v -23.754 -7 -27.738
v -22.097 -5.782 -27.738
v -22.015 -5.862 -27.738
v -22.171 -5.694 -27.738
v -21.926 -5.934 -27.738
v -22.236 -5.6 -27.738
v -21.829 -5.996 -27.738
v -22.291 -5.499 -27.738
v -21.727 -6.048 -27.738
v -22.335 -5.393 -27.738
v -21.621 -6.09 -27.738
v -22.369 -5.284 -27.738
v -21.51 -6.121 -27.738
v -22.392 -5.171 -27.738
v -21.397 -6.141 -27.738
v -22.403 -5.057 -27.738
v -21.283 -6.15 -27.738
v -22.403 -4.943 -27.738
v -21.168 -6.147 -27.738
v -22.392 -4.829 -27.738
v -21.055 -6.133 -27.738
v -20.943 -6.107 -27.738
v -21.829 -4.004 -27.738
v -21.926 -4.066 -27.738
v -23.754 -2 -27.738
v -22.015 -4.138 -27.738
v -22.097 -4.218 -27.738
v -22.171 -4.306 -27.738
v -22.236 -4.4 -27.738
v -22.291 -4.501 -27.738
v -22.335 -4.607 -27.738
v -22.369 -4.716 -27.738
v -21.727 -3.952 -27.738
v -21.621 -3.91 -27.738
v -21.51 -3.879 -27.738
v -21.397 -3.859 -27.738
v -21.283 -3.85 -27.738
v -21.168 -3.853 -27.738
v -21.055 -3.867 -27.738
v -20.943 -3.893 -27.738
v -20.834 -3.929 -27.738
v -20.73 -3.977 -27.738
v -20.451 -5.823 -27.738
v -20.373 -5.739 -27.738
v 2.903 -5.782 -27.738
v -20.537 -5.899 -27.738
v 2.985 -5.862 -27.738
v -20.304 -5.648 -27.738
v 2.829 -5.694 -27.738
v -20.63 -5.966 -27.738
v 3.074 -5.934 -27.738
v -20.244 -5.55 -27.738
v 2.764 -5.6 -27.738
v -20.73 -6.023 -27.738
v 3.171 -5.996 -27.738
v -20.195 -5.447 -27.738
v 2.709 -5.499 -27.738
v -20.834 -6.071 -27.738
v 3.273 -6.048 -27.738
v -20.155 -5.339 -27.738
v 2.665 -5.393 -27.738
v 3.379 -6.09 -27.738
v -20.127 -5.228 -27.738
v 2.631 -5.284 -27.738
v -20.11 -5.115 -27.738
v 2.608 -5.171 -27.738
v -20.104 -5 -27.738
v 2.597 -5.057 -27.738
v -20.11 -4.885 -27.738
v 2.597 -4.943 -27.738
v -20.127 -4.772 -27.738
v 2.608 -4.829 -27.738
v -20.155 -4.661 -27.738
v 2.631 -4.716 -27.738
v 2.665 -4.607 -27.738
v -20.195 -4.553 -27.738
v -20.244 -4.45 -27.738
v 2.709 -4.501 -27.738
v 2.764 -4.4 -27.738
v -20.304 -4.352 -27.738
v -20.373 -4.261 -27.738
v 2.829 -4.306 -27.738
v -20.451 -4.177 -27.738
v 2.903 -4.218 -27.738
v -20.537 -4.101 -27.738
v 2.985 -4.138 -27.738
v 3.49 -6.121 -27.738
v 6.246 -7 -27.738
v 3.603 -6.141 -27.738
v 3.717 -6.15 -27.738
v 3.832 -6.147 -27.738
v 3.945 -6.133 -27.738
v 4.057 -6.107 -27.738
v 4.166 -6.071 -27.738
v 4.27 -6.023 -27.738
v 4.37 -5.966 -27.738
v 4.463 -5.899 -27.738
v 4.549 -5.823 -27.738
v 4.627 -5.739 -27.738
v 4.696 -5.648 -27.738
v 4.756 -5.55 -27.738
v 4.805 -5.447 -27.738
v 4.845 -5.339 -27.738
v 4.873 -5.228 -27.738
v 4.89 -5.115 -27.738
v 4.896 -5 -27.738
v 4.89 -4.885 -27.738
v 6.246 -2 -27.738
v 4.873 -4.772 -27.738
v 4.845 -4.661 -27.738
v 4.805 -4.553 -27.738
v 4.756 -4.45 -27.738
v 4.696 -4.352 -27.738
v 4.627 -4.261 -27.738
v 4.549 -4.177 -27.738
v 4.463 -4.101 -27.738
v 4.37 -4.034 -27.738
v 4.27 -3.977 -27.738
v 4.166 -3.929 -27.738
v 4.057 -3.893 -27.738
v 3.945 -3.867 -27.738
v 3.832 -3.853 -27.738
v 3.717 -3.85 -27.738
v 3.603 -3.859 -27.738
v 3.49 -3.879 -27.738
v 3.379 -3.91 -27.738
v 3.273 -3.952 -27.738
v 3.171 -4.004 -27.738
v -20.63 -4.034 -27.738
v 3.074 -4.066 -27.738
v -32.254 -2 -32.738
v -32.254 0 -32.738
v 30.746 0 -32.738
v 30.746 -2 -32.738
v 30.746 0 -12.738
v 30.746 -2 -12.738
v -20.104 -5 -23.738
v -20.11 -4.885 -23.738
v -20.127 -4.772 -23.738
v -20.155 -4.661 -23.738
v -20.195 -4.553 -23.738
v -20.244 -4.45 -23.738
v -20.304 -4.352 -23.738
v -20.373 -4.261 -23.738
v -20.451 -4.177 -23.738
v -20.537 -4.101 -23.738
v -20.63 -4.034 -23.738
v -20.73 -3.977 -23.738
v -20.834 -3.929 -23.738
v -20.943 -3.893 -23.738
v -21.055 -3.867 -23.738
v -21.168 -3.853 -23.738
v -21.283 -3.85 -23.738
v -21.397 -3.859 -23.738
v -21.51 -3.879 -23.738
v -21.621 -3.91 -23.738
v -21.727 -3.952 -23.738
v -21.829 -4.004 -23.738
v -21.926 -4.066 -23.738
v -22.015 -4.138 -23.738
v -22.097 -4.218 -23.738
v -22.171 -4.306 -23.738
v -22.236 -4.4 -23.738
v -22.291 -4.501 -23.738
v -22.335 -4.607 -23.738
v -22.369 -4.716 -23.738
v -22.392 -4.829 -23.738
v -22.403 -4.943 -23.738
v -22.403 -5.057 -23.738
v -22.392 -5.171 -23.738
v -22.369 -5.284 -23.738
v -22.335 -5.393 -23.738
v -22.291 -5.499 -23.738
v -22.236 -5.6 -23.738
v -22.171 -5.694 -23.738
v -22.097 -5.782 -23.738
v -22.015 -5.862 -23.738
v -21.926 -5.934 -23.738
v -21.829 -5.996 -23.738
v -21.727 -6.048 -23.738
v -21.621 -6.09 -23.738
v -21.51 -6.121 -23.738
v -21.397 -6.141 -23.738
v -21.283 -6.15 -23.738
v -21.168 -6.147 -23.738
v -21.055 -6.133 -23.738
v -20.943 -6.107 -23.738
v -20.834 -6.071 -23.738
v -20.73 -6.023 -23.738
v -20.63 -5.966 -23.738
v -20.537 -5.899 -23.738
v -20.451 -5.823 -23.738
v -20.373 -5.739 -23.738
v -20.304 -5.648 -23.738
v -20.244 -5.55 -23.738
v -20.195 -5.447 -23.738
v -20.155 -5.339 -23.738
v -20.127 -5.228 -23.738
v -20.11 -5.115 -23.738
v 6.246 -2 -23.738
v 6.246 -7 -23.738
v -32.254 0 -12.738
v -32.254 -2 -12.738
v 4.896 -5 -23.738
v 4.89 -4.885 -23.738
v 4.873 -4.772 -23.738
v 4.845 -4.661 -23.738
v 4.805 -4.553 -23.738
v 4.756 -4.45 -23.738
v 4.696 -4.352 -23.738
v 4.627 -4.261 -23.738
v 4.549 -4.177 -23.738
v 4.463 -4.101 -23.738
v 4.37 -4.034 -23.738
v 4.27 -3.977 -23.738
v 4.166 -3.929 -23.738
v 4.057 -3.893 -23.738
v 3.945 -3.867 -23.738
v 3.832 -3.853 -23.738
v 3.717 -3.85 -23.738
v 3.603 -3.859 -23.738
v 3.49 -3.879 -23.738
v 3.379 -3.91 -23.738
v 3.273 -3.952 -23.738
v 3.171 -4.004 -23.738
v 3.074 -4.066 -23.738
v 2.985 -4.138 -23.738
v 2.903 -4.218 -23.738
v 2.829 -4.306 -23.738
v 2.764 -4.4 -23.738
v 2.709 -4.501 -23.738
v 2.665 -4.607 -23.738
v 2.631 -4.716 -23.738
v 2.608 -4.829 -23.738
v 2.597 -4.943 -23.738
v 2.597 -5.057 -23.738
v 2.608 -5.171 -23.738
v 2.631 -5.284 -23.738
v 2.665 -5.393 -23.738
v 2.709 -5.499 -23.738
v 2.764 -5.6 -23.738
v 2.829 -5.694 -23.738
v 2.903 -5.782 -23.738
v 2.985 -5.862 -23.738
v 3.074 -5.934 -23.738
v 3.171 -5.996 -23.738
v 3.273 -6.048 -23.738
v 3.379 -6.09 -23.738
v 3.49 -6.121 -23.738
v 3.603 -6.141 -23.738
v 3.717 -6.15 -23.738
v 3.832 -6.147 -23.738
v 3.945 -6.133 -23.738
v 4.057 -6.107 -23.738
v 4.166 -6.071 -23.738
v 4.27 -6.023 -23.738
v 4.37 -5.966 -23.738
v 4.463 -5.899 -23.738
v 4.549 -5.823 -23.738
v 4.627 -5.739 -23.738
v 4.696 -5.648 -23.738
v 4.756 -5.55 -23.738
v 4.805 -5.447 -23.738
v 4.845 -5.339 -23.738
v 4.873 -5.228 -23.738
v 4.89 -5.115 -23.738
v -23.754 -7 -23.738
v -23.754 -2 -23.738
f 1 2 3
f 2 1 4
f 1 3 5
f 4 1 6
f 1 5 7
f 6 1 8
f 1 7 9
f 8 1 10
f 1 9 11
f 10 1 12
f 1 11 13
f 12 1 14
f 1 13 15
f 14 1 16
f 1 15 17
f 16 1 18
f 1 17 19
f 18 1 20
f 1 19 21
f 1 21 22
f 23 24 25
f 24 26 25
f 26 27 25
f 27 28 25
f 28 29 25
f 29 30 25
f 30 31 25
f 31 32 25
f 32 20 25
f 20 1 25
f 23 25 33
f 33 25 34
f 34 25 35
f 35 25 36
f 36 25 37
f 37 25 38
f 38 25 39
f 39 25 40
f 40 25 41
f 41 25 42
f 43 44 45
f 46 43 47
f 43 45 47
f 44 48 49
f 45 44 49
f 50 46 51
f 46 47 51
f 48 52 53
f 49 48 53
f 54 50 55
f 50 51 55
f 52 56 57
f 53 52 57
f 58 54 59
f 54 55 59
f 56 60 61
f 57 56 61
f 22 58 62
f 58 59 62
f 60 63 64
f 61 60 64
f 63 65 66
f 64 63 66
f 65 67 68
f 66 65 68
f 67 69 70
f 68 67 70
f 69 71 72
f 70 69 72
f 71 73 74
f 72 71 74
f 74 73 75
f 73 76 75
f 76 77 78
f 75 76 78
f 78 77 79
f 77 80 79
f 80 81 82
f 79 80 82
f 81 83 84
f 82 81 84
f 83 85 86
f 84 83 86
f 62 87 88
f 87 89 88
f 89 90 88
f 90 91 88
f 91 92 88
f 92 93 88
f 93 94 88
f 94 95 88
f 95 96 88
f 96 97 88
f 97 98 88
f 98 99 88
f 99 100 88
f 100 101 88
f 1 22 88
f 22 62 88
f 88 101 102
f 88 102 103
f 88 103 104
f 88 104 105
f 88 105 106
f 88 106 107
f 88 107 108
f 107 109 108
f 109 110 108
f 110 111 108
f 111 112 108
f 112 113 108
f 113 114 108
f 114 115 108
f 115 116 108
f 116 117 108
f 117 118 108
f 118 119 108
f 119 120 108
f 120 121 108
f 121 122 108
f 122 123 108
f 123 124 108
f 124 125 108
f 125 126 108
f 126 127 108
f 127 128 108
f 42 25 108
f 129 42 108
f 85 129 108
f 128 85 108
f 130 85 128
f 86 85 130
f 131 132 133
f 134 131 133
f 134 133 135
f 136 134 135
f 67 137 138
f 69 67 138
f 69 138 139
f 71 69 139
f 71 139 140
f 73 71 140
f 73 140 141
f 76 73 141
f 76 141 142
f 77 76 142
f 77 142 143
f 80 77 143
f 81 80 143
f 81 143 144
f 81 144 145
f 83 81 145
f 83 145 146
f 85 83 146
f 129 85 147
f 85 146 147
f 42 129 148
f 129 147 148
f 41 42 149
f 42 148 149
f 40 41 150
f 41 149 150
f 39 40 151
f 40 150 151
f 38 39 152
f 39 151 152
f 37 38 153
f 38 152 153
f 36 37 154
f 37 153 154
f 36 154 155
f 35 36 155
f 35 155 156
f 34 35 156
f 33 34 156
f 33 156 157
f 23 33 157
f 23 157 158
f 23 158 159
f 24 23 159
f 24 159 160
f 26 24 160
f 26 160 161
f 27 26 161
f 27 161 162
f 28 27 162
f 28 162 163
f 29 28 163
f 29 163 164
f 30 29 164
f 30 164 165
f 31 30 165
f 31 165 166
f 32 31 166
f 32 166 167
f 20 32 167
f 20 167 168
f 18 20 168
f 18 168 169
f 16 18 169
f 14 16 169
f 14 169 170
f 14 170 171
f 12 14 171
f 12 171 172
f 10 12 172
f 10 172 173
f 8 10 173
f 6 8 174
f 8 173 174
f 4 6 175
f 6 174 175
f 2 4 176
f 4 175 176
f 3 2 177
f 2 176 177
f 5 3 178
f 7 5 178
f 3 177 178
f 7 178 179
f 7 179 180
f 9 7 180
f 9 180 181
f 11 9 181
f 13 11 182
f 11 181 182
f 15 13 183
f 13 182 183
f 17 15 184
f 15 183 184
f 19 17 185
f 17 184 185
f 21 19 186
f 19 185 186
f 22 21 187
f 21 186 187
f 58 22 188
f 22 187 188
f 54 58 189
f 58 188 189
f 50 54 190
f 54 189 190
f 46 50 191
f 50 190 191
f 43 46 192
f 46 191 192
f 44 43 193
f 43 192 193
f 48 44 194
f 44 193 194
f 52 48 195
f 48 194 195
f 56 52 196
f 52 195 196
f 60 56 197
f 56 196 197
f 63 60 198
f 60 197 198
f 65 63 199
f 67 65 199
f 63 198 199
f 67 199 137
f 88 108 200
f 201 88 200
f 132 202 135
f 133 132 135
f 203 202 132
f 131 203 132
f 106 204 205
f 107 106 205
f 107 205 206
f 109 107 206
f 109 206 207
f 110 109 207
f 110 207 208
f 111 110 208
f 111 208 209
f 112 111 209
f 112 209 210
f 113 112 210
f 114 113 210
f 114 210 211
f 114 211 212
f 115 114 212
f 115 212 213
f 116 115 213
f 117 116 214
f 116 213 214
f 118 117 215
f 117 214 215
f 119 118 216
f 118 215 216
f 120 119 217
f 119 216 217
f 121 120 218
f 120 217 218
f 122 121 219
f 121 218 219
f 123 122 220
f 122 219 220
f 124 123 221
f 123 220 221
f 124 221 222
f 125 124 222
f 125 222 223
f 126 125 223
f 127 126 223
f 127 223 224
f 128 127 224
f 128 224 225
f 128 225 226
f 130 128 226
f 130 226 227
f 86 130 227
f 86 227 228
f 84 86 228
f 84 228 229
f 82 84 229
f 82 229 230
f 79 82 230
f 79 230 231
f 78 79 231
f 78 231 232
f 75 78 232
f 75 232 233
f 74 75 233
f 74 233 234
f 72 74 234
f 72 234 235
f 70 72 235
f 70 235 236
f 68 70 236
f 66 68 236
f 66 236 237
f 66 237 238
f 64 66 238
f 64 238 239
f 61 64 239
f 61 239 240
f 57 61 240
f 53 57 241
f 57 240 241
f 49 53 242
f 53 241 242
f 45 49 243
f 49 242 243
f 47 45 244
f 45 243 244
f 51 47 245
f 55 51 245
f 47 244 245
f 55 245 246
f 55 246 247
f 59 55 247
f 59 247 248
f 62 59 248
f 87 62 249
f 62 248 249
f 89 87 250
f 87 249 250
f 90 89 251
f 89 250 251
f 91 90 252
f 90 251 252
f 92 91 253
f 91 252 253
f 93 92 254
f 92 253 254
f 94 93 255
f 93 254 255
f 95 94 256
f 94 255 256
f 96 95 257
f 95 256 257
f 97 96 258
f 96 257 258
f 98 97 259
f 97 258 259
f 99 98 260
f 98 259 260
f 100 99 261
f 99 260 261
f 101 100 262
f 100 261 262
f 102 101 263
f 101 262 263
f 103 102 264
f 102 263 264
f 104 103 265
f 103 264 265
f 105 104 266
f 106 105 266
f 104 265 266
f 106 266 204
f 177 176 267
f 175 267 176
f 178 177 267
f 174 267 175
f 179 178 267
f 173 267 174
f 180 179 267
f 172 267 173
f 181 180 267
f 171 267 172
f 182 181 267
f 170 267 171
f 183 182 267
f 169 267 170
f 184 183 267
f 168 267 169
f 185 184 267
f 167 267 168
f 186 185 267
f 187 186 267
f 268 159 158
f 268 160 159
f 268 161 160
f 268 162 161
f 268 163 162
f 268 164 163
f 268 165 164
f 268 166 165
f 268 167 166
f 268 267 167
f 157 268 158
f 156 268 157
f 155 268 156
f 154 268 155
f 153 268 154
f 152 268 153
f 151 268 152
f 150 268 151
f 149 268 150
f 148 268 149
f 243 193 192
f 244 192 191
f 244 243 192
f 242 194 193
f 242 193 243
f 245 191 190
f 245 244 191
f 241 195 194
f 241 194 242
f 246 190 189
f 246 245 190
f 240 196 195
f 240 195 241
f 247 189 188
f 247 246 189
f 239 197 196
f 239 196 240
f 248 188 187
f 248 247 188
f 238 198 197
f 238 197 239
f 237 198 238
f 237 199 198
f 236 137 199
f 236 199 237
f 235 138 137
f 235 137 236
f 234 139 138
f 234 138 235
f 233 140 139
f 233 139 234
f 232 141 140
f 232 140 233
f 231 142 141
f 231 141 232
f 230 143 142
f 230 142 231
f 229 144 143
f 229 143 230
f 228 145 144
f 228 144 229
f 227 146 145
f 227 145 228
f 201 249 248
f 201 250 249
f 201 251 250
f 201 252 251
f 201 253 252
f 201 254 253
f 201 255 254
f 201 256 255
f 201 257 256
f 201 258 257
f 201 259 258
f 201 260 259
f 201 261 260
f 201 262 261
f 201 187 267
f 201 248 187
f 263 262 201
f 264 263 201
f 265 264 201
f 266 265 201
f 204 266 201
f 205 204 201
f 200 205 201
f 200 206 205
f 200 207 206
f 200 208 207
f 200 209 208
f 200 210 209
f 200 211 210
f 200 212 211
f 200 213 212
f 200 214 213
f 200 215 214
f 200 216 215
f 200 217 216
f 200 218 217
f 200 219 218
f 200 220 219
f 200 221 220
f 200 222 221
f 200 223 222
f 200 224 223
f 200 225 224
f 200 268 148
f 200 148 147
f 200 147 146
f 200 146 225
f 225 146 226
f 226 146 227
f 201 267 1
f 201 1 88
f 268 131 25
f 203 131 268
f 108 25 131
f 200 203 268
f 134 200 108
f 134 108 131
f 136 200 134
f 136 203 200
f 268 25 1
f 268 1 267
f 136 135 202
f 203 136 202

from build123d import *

# Parameters (mm, degrees)
F1_DEPTH = 2
F2_W     = 30
F2_H     = 4
F3_DEPTH = 5
F4_R     = 1.15
F5_DEPTH = 25


with BuildPart() as f1:
    # F0 (on Front) → F1 (new body)
    with BuildSketch(Plane.XZ):
        Polygon((-32.254396, -12.737582), (-32.254396, -22.737582), (-32.254396, -32.737582), (30.745604, -32.737582), (30.745604, -12.737582), align=None)
    extrude(amount=F1_DEPTH)

    # F2 (on face) → F3 (join)
    with BuildSketch(Plane.XZ.offset(2)):
        with Locations((-8.754396, -25.737582)):
            Rectangle(F2_W, F2_H)
    extrude(amount=F3_DEPTH)

    # F4 (on face) → F5 (cut)
    with BuildSketch(Plane.XY.offset(-23.737582)):
        with Locations((-21.254396, -5)):
            Circle(F4_R)
        with Locations((3.745604, -5)):
            Circle(F4_R)
    extrude(amount=-F5_DEPTH, mode=Mode.SUBTRACT)


solid = f1.part
